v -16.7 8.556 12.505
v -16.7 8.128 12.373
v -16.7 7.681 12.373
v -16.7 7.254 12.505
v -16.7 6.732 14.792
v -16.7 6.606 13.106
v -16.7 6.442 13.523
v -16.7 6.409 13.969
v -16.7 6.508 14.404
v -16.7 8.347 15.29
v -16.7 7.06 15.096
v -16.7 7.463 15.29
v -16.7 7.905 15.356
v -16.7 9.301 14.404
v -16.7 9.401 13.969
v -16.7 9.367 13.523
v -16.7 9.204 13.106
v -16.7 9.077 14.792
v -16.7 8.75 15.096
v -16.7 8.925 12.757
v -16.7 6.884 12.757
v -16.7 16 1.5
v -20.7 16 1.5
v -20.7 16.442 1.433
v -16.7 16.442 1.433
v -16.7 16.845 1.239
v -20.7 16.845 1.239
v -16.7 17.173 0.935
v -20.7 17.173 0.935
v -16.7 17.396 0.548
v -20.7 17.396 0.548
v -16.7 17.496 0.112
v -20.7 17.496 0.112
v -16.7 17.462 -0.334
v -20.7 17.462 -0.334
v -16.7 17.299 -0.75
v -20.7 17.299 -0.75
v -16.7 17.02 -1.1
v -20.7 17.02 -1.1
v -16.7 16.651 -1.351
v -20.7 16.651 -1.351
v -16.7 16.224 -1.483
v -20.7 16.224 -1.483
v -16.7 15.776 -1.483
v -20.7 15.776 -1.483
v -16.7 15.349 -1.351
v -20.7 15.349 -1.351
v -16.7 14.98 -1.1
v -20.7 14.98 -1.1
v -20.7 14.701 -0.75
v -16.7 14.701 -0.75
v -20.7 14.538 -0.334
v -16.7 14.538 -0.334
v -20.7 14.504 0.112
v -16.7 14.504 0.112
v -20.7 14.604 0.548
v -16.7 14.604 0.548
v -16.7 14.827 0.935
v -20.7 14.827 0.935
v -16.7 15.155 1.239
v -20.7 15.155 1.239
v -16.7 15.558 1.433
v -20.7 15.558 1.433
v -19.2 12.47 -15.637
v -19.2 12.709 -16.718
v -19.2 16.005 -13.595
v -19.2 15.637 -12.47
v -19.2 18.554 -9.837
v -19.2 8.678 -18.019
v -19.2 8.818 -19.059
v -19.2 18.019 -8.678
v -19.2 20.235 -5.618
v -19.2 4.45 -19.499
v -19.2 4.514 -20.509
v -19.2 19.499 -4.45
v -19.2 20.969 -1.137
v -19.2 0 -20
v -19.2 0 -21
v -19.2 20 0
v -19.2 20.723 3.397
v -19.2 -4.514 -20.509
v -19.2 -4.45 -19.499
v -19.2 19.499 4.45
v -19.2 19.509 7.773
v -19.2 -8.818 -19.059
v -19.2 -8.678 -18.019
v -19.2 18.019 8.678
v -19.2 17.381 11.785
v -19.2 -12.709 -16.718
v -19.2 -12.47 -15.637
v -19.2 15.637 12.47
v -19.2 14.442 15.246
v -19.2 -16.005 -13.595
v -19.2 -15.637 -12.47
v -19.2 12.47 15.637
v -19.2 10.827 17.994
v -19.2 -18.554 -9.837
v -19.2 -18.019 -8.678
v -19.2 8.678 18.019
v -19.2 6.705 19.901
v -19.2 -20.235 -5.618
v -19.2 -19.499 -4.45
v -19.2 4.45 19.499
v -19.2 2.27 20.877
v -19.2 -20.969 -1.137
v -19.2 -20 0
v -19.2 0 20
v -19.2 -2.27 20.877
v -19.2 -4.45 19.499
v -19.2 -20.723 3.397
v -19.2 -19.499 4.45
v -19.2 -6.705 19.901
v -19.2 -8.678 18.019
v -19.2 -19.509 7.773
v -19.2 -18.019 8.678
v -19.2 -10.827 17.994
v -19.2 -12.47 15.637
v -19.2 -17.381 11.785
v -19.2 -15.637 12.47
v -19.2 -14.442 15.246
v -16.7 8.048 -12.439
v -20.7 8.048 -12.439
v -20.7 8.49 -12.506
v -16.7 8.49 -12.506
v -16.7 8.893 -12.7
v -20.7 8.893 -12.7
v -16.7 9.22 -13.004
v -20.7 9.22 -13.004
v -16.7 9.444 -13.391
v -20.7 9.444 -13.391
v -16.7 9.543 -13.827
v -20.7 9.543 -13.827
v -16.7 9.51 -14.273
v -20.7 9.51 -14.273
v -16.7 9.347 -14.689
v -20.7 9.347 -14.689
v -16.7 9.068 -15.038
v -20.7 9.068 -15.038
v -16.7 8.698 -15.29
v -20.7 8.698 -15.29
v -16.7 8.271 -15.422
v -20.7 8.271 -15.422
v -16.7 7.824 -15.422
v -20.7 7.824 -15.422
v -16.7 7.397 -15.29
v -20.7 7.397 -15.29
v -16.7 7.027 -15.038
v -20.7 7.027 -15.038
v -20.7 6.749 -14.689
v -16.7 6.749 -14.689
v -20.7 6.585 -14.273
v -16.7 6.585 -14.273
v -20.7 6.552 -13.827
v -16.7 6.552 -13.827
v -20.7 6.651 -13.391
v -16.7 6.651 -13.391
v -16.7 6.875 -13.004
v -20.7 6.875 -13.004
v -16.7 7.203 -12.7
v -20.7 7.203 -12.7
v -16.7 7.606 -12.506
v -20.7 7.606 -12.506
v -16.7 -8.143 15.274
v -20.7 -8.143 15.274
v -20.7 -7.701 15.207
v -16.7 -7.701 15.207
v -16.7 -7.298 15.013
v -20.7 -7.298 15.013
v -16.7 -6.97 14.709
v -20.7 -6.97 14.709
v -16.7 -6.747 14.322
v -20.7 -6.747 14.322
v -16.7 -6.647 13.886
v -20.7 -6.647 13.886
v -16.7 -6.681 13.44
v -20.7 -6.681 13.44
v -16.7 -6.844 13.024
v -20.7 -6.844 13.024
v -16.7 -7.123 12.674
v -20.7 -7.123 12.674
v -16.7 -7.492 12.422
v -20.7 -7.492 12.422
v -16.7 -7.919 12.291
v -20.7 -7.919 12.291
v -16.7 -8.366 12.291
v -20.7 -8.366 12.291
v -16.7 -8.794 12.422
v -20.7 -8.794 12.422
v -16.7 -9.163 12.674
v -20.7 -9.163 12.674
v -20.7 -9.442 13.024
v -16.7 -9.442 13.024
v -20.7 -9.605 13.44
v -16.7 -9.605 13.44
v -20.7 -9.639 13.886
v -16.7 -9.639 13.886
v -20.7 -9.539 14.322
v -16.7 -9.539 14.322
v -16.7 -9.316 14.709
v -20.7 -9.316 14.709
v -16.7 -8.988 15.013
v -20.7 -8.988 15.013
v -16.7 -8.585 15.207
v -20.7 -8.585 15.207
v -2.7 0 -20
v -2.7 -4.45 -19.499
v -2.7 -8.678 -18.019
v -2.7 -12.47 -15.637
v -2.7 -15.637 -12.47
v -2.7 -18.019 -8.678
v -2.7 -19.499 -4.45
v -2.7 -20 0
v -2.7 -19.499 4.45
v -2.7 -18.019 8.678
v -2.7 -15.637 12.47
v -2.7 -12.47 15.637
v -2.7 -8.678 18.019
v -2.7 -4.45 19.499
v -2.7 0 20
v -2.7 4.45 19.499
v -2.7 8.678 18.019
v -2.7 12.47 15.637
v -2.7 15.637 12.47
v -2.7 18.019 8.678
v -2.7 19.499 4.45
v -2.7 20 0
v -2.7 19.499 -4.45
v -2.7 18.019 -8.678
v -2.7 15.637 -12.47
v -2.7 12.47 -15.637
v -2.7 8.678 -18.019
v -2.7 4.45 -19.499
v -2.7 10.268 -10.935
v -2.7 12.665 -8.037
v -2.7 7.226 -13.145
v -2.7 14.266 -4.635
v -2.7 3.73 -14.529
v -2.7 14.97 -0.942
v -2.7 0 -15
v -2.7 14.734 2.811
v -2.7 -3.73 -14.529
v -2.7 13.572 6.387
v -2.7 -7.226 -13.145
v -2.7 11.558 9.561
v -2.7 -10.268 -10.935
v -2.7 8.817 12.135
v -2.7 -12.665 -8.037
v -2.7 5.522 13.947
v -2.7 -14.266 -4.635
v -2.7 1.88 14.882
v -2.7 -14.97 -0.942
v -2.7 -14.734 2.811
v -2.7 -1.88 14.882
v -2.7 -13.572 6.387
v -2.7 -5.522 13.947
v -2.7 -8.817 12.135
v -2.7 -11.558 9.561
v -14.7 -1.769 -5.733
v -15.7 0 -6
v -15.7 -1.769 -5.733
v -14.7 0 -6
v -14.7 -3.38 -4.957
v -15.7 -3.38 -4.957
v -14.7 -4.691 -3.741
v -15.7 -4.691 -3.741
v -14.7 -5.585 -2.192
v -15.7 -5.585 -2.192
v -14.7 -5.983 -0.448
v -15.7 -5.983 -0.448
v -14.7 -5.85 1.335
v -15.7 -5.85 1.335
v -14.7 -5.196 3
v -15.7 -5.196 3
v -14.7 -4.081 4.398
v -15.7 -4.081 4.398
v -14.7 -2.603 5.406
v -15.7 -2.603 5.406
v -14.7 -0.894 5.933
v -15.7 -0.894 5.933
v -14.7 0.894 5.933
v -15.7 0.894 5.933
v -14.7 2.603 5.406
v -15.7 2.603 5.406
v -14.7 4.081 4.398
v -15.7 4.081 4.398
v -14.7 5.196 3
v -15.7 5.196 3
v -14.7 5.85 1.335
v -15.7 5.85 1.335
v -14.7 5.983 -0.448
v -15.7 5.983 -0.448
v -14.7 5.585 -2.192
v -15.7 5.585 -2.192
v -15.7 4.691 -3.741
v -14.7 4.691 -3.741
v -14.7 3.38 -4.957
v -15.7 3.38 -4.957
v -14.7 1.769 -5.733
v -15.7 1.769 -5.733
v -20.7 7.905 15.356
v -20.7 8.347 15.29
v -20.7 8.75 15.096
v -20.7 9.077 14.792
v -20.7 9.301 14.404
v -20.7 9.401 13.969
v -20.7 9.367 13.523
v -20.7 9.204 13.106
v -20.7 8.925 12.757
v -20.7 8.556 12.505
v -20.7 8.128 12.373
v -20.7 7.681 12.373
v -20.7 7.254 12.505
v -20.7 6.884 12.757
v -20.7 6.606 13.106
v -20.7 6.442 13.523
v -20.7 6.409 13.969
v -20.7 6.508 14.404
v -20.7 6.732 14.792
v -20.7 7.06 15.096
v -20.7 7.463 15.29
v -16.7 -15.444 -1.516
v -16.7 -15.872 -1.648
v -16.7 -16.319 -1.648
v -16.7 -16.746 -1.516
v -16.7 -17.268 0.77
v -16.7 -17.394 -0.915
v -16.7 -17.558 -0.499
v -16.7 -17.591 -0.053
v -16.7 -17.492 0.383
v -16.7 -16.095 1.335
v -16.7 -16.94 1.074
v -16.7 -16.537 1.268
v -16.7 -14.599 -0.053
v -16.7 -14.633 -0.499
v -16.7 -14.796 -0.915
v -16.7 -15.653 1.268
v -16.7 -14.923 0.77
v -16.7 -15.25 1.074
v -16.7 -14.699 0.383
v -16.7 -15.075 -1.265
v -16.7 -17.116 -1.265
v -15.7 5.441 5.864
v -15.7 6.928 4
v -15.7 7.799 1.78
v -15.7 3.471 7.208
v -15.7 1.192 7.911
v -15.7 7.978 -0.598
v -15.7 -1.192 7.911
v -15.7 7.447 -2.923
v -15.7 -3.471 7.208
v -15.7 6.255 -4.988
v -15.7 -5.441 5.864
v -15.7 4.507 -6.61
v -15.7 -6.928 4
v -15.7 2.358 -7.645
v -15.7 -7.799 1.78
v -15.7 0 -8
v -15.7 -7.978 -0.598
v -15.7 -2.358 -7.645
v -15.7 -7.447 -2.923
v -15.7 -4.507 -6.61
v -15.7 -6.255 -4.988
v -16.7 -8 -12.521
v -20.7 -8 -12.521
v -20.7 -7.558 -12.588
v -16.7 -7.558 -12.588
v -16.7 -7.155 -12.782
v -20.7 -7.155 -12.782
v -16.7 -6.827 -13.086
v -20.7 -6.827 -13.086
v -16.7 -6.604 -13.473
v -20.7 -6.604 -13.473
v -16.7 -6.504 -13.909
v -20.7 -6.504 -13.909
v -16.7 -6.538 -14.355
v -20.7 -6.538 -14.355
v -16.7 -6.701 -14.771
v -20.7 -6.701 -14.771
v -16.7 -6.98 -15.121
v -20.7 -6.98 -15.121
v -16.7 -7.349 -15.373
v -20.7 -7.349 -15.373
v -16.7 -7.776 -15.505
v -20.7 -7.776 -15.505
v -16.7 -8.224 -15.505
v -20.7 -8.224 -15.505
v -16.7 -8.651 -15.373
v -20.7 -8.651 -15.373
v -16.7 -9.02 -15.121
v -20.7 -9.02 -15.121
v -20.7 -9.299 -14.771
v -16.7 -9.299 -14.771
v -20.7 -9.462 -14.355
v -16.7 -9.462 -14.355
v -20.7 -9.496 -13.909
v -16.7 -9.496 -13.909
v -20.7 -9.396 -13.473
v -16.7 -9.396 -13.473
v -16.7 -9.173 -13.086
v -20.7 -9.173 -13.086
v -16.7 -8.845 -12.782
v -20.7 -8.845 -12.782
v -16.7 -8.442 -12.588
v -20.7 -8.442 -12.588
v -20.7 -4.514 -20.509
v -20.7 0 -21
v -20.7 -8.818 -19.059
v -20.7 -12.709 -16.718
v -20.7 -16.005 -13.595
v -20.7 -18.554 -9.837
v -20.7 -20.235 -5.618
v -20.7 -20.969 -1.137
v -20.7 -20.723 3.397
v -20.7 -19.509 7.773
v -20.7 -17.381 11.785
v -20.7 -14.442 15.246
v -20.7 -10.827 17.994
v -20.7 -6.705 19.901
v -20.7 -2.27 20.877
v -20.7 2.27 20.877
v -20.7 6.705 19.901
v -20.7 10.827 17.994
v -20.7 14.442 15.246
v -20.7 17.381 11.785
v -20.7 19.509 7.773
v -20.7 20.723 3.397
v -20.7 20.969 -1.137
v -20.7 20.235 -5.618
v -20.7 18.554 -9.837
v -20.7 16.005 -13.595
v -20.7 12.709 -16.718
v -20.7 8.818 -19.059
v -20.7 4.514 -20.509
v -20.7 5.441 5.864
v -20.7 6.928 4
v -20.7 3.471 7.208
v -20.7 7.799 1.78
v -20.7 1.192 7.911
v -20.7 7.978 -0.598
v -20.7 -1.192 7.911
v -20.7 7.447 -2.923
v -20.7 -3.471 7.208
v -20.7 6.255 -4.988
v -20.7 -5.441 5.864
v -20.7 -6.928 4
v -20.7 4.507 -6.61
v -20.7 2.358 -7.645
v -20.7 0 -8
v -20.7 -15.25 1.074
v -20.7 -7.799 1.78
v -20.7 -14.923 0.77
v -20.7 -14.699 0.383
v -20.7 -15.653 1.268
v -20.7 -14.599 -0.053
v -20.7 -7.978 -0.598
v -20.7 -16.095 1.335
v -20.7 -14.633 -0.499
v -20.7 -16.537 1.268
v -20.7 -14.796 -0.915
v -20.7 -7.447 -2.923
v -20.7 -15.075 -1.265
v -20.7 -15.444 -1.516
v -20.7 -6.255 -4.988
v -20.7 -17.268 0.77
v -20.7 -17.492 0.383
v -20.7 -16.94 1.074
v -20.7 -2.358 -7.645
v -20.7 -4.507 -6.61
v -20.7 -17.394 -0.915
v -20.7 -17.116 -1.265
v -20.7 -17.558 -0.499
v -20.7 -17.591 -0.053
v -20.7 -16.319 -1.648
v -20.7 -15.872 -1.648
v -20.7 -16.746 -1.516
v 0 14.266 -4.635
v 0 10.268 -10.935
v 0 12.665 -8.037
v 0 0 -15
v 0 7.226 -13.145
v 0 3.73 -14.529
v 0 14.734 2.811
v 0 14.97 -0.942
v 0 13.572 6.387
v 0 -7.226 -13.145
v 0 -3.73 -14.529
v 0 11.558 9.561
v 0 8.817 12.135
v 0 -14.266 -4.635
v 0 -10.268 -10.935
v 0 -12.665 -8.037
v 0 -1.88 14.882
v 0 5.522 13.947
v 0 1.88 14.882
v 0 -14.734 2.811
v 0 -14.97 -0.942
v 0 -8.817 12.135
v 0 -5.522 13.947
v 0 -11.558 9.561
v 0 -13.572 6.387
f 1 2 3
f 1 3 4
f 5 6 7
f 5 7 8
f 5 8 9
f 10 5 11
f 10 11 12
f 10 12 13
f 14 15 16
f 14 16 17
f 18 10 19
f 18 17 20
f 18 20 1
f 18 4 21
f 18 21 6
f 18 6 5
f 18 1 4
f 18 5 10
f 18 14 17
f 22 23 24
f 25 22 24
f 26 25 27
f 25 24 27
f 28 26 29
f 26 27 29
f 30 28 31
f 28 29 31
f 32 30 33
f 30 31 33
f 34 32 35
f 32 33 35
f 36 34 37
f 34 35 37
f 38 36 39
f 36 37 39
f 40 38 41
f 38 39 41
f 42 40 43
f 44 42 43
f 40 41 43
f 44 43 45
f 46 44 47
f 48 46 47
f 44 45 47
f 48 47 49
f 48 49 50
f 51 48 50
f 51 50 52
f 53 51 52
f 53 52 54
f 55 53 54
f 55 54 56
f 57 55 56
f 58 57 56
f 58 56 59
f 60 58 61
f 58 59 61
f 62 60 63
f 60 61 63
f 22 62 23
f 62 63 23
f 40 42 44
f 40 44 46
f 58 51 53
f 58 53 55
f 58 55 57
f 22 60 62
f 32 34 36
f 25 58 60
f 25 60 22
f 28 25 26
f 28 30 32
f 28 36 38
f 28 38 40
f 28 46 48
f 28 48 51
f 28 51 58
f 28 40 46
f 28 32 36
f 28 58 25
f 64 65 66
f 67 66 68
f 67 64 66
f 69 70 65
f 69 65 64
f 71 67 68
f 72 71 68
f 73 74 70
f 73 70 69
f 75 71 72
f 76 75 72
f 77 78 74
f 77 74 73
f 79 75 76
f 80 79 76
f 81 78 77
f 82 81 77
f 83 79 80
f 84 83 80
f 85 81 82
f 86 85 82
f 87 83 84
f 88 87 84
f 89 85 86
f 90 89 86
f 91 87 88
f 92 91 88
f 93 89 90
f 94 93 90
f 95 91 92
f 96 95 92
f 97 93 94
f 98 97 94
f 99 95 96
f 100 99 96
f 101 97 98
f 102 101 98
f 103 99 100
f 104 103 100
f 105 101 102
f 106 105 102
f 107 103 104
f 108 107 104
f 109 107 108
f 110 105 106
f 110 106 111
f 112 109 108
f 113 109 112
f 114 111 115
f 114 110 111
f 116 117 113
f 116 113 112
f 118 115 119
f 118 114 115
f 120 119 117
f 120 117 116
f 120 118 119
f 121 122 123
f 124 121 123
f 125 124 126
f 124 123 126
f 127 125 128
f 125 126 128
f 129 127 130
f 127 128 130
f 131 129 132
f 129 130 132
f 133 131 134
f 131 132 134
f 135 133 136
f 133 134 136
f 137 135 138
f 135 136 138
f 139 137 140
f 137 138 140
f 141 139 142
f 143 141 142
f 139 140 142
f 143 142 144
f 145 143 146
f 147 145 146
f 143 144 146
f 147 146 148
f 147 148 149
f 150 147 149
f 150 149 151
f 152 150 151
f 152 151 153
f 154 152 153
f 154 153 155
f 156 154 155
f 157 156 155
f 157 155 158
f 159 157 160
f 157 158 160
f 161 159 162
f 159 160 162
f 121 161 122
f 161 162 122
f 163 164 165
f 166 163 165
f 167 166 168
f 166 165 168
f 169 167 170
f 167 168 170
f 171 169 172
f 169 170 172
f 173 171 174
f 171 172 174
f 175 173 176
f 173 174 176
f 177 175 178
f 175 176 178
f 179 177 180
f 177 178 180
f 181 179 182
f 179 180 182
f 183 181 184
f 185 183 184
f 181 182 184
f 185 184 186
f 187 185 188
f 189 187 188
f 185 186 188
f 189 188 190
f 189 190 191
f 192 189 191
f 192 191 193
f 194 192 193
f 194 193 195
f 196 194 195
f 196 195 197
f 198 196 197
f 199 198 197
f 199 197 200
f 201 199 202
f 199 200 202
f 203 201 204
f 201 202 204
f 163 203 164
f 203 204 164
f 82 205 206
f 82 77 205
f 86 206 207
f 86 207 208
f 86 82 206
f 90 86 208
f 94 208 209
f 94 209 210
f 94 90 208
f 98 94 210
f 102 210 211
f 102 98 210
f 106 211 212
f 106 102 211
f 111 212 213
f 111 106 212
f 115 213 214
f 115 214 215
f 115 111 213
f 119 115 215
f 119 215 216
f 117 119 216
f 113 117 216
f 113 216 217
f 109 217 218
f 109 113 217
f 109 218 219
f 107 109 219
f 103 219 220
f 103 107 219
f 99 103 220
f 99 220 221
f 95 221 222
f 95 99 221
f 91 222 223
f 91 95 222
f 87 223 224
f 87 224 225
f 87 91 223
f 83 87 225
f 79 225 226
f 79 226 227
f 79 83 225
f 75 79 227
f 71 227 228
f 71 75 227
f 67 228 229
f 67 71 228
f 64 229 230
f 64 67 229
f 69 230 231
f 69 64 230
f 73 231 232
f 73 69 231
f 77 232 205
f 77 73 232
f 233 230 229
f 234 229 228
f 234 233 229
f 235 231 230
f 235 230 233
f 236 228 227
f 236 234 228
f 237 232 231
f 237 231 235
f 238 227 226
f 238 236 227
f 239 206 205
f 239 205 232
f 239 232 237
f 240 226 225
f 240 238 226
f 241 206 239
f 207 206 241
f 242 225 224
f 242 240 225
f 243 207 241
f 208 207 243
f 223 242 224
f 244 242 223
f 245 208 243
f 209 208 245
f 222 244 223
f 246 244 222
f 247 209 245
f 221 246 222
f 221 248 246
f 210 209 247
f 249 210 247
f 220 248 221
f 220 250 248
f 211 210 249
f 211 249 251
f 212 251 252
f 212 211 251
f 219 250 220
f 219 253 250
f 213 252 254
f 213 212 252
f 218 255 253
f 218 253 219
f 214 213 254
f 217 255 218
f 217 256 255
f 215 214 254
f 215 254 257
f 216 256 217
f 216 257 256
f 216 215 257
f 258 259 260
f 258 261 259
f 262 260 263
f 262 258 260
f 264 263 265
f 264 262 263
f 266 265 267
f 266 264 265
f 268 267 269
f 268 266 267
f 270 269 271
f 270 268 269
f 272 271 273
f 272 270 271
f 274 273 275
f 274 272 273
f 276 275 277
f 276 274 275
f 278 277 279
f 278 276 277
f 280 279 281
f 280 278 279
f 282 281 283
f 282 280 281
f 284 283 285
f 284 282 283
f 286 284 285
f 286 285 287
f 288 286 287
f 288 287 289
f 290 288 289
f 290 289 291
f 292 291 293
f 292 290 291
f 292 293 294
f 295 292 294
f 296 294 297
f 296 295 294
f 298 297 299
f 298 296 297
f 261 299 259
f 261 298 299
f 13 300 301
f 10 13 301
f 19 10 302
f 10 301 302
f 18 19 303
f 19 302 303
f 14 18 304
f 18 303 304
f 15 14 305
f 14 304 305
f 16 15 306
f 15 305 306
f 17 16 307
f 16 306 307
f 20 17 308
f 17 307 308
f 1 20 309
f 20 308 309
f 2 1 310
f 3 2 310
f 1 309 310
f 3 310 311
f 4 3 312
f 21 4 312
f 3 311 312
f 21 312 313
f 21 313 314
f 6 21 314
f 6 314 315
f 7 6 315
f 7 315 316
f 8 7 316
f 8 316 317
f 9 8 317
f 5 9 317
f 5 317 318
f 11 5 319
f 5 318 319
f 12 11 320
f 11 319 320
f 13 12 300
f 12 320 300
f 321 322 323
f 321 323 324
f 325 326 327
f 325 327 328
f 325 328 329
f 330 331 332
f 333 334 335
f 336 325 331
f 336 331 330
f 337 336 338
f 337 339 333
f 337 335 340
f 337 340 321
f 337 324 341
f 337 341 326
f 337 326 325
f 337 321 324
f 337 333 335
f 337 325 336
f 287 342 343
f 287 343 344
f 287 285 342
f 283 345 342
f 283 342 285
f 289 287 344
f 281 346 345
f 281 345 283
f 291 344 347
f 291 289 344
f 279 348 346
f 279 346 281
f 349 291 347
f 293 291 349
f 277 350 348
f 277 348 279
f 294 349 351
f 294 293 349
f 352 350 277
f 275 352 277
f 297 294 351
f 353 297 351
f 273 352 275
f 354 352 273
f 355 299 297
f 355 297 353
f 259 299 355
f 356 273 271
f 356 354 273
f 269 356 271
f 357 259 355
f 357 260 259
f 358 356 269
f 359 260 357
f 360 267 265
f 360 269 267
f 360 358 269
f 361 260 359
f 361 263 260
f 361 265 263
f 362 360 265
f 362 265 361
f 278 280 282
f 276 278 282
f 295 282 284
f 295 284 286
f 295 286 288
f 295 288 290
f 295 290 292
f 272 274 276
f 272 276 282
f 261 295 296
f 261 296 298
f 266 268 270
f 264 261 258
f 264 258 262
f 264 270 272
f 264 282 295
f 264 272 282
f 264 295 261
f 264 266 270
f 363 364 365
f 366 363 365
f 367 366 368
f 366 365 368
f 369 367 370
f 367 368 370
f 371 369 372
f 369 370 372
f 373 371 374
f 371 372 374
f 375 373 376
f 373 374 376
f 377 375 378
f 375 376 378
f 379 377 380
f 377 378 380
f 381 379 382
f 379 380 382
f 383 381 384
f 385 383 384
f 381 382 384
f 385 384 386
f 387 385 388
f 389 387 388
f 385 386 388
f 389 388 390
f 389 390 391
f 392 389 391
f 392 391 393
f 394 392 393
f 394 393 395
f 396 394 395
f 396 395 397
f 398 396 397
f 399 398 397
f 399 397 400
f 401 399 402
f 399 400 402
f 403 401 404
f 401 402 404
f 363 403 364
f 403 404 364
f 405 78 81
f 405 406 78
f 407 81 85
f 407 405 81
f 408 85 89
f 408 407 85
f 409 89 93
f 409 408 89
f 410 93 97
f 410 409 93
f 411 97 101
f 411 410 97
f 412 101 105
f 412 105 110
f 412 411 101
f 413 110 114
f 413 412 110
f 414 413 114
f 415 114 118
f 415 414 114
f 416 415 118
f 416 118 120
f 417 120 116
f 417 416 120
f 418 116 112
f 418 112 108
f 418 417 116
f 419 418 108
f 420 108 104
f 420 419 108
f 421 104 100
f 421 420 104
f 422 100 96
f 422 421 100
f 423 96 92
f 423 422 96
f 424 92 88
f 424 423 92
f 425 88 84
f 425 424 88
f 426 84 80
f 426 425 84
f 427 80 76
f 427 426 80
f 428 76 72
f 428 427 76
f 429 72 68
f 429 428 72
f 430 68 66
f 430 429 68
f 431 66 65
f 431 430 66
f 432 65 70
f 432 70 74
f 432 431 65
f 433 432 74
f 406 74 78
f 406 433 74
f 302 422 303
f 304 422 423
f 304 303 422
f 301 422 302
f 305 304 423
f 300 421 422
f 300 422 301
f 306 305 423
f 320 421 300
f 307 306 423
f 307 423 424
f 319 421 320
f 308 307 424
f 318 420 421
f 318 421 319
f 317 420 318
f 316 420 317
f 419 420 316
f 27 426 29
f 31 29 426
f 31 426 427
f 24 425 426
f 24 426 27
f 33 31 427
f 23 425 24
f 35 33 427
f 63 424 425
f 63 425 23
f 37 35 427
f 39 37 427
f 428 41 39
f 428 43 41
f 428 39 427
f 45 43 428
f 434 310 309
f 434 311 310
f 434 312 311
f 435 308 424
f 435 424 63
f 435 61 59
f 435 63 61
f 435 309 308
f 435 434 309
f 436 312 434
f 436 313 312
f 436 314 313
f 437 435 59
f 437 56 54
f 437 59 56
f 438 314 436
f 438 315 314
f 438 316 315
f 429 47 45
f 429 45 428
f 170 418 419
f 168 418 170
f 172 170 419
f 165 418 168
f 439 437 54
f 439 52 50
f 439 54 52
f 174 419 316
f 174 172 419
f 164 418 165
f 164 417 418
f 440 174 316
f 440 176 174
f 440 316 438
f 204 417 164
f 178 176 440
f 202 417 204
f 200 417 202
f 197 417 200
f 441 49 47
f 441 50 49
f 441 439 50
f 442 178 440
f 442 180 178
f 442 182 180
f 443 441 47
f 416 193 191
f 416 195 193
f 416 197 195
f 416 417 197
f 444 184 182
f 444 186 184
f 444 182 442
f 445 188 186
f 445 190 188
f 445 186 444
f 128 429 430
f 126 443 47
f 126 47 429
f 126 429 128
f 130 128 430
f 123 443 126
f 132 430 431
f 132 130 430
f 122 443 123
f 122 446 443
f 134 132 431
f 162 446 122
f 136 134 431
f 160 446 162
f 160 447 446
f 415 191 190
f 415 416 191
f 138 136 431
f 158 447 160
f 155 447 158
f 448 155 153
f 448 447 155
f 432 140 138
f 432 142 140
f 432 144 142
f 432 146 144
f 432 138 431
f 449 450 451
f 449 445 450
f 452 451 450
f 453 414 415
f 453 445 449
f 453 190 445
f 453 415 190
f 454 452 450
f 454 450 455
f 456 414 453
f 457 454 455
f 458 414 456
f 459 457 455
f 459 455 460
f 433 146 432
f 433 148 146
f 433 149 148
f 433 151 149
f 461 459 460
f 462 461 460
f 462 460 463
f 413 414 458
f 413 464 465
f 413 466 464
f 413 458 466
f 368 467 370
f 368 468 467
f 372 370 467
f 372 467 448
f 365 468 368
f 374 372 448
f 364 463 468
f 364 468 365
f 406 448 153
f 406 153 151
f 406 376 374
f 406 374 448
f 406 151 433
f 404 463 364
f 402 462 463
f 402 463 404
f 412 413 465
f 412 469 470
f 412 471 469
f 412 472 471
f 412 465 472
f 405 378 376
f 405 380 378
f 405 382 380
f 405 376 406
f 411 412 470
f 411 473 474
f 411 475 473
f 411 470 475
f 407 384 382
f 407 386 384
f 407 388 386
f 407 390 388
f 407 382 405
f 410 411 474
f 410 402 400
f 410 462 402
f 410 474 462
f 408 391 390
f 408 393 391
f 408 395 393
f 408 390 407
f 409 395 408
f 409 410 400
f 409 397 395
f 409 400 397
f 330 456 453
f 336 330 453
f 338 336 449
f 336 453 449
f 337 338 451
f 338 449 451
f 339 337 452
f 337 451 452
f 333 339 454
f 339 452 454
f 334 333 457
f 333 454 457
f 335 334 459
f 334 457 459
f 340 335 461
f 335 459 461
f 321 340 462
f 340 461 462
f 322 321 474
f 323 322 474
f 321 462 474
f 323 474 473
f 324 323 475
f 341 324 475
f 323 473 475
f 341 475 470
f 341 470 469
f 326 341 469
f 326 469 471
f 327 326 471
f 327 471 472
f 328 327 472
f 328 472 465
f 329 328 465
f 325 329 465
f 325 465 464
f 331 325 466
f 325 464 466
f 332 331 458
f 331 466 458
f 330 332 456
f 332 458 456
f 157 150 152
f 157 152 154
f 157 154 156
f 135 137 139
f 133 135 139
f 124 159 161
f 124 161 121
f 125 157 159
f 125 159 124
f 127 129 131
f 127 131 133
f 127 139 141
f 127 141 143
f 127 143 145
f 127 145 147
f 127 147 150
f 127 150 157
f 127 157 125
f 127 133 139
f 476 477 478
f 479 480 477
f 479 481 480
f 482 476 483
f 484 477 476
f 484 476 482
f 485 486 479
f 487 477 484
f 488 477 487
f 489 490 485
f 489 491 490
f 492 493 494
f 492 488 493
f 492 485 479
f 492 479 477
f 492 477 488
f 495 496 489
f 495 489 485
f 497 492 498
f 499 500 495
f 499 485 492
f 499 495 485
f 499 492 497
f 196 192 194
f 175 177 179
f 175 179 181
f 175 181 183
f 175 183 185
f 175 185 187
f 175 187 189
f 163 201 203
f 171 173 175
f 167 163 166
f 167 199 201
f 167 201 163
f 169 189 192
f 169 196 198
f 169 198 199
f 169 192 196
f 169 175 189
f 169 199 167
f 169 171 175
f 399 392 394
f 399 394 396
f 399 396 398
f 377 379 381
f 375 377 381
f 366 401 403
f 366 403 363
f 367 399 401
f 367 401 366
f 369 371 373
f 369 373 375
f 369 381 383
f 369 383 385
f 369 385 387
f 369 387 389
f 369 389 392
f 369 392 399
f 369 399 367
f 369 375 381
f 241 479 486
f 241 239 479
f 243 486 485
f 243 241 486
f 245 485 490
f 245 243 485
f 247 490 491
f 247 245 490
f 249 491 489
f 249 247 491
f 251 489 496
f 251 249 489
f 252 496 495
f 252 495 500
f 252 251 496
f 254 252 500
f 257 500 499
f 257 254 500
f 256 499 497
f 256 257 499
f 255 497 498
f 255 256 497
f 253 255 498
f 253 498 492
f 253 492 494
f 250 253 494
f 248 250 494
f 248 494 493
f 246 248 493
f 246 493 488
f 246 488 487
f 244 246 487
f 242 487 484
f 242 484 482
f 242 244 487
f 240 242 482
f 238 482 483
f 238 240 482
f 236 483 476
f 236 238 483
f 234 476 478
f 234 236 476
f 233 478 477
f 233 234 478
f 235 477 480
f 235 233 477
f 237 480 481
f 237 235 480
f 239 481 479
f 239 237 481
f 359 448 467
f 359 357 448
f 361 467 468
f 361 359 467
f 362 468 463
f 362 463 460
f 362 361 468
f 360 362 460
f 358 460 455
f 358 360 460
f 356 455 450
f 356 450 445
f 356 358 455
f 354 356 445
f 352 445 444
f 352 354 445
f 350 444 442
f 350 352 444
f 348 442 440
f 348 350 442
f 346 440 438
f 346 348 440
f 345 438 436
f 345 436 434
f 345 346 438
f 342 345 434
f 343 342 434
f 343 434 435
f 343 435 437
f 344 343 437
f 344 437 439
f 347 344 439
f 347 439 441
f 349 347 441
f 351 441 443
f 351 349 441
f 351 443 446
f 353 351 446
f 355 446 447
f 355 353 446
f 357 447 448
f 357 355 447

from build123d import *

# Parameters (mm, degrees)
SKETCH3_R          = 1.5
CUT_EXTRUDE1_DEPTH = 4


with BuildPart() as part:
    # Sketch2 → Revolve1 (revolve)
    with BuildSketch(Plane(origin=(0, 0, 0), x_dir=(1, 0, 0), z_dir=(0, 1, 0))):
        Polygon((0, 0), (0, 15), (-2.7, 15), (-2.7, 20), (-19.2, 20), (-19.2, 21), (-20.7, 21), (-20.7, 17.652837292), (-20.7, 14.5), (-20.7, 8), (-15.7, 8), (-15.7, 6), (-14.7, 6), (-14.7, 0), align=None)
    revolve(axis=Axis((0, 0, 0), (-1, 0, 0)))

    # Sketch3 → Cut-Extrude1 (cut)
    with BuildSketch(Plane.ZY.offset(20.7)):
        with Locations((0, 16)):
            Circle(SKETCH3_R)
        with Locations((13.856406461, 7.904729806)):
            Circle(SKETCH3_R)
        with Locations((13.773900052, -8.142905292)):
            Circle(SKETCH3_R)
        with Locations((-0.165012817, -16.095270194)):
            Circle(SKETCH3_R)
        with Locations((-14.021419278, -8)):
            Circle(SKETCH3_R)
        with Locations((-13.938912869, 8.047635097)):
            Circle(SKETCH3_R)
    extrude(amount=-CUT_EXTRUDE1_DEPTH, mode=Mode.SUBTRACT)


solid = part.part
